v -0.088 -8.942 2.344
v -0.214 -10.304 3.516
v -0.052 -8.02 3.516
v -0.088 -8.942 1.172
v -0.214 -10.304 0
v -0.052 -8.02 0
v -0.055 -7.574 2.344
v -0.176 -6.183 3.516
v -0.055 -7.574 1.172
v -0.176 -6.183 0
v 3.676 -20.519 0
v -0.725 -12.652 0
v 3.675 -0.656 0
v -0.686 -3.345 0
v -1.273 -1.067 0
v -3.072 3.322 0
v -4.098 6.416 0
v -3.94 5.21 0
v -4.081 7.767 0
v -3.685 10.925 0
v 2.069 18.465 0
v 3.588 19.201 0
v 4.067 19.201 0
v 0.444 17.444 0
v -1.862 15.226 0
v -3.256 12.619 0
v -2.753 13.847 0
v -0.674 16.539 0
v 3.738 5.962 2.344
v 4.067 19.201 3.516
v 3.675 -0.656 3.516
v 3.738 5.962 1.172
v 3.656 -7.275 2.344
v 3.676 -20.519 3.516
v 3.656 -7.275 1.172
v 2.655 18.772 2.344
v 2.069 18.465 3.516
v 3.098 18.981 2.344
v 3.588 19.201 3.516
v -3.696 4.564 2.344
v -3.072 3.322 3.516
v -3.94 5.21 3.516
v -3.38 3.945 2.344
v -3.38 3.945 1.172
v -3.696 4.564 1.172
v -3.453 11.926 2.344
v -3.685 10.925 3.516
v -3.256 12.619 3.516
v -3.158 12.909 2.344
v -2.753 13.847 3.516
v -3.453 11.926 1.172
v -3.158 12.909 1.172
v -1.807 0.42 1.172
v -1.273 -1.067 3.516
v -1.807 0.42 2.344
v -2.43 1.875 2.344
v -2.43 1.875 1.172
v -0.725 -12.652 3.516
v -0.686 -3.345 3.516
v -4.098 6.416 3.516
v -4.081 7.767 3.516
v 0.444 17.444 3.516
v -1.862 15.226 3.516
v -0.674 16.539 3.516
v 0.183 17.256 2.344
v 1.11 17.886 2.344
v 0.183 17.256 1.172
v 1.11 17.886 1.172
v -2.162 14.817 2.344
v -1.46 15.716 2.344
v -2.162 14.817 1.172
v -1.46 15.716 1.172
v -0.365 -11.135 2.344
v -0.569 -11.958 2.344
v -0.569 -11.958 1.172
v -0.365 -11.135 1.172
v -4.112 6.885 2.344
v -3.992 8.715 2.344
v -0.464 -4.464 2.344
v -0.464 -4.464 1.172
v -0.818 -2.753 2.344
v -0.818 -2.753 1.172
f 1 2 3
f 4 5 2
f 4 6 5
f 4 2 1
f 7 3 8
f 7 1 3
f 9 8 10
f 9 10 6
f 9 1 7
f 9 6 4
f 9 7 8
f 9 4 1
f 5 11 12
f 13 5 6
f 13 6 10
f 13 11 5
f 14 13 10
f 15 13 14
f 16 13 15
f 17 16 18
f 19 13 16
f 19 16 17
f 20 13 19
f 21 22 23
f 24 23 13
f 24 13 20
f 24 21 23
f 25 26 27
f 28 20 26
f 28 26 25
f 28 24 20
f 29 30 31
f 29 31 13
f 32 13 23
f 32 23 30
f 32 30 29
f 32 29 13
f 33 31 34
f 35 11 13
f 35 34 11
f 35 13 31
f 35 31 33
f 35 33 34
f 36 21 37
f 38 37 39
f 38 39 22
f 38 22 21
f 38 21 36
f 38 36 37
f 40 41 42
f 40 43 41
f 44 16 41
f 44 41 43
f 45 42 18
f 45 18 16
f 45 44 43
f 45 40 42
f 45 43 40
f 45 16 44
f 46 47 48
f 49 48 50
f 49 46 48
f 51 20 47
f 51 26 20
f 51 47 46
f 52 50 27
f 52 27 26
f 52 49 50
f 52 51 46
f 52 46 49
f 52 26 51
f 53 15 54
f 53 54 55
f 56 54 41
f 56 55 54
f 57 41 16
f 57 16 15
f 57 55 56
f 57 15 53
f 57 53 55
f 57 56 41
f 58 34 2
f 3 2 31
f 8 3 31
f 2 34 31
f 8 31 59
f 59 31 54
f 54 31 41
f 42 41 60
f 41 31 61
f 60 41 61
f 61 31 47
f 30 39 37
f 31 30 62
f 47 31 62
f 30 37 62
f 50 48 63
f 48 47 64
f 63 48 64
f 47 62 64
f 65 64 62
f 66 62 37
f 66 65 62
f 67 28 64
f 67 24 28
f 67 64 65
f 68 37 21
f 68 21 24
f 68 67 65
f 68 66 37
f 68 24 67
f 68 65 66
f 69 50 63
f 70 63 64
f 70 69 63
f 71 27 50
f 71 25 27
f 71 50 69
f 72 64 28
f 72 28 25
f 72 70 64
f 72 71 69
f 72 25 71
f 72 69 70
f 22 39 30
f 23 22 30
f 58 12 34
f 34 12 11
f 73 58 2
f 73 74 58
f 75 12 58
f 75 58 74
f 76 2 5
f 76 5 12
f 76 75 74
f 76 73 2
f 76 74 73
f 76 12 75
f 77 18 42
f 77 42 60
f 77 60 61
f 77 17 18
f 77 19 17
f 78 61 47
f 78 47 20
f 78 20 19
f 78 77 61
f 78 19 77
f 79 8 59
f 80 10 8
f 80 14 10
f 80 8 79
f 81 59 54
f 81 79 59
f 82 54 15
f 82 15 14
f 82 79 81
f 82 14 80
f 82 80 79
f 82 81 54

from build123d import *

# Parameters (mm, degrees)
F1_DEPTH = 2000
F2_SCALE = 0.002
F3_SCALE = 0.879
F6_DEPTH = 25


with BuildPart() as f1:
    # F0 (on Top) → F1 (new body)
    with BuildSketch(Plane.XY):
        with BuildLine():
            add(Edge.make_bspline(
                [(-412.198312, -7196.5613752), (-356.795832, -6861.2712152), (-172.67428, -6313.9113752), (-121.910856, -5861.2467992)],
                knots=[0, 0, 0, 0, 1, 1, 1, 1], degree=3))
            Line((-412.198312, -7196.5613752), (2090.874152, -11671.5049272))
            add(Edge.make_bspline(
                [(2342.598312, 11671.5049272), (2025.496584, 3887.293724), (2077.639736, -3883.8242872), (2090.874152, -11671.5049272)],
                knots=[0, 0, 0, 0, 1, 1, 1, 1], degree=3))
            Line((2342.598312, 11671.5049272), (2040.716264, 10922.0358648))
            add(Edge.make_bspline(
                [(1177.116264, 10503.6115048), (1586.7336988449, 10725.549697876), (1712.6262187958, 10774.0869522095), (2040.716264, 10922.0358648)],
                knots=[0, 0, 0, 0, 959.6269613977, 959.6269613977, 959.6269613977, 959.6269613977], degree=3))
            add(Edge.make_bspline(
                [(-383.16916, 9407.7831656), (76.333096, 9846.8536616), (629.31548, 10181.3694264), (1177.116264, 10503.6115048)],
                knots=[0, 0, 0, 0, 1, 1, 1, 1], degree=3))
            add(Edge.make_bspline(
                [(-1566.083736, 7876.5258776), (-1266.42876, 8447.6749512), (-849.490808, 8962.1962488), (-383.16916, 9407.7831656)],
                knots=[0, 0, 0, 0, 1, 1, 1, 1], degree=3))
            add(Edge.make_bspline(
                [(-2095.854584, 6214.6402504), (-1973.918328, 6783.1377672), (-1836.209688, 7361.6573112), (-1566.083736, 7876.5258776)],
                knots=[0, 0, 0, 0, 1, 1, 1, 1], degree=3))
            add(Edge.make_bspline(
                [(-2240.998312, 2963.4402504), (-2441.5702819824, 3915.4086112976), (-2303.8938045502, 4806.2567710876), (-2095.854584, 6214.6402504)],
                knots=[0, 0, 0, 0, 3254.438222148, 3254.438222148, 3254.438222148, 3254.438222148], degree=3))
            add(Edge.make_bspline(
                [(-1747.512888, 1889.3831656), (-1904.509272, 2250.753436), (-2139.109768, 2582.8419768), (-2240.998312, 2963.4402504)],
                knots=[0, 0, 0, 0, 1, 1, 1, 1], degree=3))
            add(Edge.make_bspline(
                [(-724.256616, -607.0741224), (-990.141784, 252.0658408), (-1389.155464, 1064.5218232), (-1747.512888, 1889.3831656)],
                knots=[0, 0, 0, 0, 1, 1, 1, 1], degree=3))
            add(Edge.make_bspline(
                [(-100.14204, -3517.1884952), (-250.745752, -2540.5018024), (-430.947576, -1554.8212744), (-724.256616, -607.0741224)],
                knots=[0, 0, 0, 0, 1, 1, 1, 1], degree=3))
            add(Edge.make_bspline(
                [(-121.910856, -5861.2467992), (-34.831528, -5084.7281592), (23.440136, -4318.6357112), (-100.14204, -3517.1884952)],
                knots=[0, 0, 0, 0, 1, 1, 1, 1], degree=3))
        make_face()
    extrude(amount=F1_DEPTH)


with BuildPart() as f1_1:
    # F2: moved
    add(f1.part.scale(F2_SCALE))


with BuildPart() as f1_2:
    # F3: moved
    add(f1_1.part.scale(F3_SCALE))

    # F5 (on face) → F6 (cut)
    with BuildSketch(Plane.XY.offset(3.516)):
        Polygon((3.5493720789, 20.6044446677), (3.5875791921, 19.2009390503), (4.4617429376, 19.2009390503), (4.5047998428, 20.6810384989), align=None)
    extrude(amount=-F6_DEPTH, mode=Mode.SUBTRACT)


solid = f1_2.part
